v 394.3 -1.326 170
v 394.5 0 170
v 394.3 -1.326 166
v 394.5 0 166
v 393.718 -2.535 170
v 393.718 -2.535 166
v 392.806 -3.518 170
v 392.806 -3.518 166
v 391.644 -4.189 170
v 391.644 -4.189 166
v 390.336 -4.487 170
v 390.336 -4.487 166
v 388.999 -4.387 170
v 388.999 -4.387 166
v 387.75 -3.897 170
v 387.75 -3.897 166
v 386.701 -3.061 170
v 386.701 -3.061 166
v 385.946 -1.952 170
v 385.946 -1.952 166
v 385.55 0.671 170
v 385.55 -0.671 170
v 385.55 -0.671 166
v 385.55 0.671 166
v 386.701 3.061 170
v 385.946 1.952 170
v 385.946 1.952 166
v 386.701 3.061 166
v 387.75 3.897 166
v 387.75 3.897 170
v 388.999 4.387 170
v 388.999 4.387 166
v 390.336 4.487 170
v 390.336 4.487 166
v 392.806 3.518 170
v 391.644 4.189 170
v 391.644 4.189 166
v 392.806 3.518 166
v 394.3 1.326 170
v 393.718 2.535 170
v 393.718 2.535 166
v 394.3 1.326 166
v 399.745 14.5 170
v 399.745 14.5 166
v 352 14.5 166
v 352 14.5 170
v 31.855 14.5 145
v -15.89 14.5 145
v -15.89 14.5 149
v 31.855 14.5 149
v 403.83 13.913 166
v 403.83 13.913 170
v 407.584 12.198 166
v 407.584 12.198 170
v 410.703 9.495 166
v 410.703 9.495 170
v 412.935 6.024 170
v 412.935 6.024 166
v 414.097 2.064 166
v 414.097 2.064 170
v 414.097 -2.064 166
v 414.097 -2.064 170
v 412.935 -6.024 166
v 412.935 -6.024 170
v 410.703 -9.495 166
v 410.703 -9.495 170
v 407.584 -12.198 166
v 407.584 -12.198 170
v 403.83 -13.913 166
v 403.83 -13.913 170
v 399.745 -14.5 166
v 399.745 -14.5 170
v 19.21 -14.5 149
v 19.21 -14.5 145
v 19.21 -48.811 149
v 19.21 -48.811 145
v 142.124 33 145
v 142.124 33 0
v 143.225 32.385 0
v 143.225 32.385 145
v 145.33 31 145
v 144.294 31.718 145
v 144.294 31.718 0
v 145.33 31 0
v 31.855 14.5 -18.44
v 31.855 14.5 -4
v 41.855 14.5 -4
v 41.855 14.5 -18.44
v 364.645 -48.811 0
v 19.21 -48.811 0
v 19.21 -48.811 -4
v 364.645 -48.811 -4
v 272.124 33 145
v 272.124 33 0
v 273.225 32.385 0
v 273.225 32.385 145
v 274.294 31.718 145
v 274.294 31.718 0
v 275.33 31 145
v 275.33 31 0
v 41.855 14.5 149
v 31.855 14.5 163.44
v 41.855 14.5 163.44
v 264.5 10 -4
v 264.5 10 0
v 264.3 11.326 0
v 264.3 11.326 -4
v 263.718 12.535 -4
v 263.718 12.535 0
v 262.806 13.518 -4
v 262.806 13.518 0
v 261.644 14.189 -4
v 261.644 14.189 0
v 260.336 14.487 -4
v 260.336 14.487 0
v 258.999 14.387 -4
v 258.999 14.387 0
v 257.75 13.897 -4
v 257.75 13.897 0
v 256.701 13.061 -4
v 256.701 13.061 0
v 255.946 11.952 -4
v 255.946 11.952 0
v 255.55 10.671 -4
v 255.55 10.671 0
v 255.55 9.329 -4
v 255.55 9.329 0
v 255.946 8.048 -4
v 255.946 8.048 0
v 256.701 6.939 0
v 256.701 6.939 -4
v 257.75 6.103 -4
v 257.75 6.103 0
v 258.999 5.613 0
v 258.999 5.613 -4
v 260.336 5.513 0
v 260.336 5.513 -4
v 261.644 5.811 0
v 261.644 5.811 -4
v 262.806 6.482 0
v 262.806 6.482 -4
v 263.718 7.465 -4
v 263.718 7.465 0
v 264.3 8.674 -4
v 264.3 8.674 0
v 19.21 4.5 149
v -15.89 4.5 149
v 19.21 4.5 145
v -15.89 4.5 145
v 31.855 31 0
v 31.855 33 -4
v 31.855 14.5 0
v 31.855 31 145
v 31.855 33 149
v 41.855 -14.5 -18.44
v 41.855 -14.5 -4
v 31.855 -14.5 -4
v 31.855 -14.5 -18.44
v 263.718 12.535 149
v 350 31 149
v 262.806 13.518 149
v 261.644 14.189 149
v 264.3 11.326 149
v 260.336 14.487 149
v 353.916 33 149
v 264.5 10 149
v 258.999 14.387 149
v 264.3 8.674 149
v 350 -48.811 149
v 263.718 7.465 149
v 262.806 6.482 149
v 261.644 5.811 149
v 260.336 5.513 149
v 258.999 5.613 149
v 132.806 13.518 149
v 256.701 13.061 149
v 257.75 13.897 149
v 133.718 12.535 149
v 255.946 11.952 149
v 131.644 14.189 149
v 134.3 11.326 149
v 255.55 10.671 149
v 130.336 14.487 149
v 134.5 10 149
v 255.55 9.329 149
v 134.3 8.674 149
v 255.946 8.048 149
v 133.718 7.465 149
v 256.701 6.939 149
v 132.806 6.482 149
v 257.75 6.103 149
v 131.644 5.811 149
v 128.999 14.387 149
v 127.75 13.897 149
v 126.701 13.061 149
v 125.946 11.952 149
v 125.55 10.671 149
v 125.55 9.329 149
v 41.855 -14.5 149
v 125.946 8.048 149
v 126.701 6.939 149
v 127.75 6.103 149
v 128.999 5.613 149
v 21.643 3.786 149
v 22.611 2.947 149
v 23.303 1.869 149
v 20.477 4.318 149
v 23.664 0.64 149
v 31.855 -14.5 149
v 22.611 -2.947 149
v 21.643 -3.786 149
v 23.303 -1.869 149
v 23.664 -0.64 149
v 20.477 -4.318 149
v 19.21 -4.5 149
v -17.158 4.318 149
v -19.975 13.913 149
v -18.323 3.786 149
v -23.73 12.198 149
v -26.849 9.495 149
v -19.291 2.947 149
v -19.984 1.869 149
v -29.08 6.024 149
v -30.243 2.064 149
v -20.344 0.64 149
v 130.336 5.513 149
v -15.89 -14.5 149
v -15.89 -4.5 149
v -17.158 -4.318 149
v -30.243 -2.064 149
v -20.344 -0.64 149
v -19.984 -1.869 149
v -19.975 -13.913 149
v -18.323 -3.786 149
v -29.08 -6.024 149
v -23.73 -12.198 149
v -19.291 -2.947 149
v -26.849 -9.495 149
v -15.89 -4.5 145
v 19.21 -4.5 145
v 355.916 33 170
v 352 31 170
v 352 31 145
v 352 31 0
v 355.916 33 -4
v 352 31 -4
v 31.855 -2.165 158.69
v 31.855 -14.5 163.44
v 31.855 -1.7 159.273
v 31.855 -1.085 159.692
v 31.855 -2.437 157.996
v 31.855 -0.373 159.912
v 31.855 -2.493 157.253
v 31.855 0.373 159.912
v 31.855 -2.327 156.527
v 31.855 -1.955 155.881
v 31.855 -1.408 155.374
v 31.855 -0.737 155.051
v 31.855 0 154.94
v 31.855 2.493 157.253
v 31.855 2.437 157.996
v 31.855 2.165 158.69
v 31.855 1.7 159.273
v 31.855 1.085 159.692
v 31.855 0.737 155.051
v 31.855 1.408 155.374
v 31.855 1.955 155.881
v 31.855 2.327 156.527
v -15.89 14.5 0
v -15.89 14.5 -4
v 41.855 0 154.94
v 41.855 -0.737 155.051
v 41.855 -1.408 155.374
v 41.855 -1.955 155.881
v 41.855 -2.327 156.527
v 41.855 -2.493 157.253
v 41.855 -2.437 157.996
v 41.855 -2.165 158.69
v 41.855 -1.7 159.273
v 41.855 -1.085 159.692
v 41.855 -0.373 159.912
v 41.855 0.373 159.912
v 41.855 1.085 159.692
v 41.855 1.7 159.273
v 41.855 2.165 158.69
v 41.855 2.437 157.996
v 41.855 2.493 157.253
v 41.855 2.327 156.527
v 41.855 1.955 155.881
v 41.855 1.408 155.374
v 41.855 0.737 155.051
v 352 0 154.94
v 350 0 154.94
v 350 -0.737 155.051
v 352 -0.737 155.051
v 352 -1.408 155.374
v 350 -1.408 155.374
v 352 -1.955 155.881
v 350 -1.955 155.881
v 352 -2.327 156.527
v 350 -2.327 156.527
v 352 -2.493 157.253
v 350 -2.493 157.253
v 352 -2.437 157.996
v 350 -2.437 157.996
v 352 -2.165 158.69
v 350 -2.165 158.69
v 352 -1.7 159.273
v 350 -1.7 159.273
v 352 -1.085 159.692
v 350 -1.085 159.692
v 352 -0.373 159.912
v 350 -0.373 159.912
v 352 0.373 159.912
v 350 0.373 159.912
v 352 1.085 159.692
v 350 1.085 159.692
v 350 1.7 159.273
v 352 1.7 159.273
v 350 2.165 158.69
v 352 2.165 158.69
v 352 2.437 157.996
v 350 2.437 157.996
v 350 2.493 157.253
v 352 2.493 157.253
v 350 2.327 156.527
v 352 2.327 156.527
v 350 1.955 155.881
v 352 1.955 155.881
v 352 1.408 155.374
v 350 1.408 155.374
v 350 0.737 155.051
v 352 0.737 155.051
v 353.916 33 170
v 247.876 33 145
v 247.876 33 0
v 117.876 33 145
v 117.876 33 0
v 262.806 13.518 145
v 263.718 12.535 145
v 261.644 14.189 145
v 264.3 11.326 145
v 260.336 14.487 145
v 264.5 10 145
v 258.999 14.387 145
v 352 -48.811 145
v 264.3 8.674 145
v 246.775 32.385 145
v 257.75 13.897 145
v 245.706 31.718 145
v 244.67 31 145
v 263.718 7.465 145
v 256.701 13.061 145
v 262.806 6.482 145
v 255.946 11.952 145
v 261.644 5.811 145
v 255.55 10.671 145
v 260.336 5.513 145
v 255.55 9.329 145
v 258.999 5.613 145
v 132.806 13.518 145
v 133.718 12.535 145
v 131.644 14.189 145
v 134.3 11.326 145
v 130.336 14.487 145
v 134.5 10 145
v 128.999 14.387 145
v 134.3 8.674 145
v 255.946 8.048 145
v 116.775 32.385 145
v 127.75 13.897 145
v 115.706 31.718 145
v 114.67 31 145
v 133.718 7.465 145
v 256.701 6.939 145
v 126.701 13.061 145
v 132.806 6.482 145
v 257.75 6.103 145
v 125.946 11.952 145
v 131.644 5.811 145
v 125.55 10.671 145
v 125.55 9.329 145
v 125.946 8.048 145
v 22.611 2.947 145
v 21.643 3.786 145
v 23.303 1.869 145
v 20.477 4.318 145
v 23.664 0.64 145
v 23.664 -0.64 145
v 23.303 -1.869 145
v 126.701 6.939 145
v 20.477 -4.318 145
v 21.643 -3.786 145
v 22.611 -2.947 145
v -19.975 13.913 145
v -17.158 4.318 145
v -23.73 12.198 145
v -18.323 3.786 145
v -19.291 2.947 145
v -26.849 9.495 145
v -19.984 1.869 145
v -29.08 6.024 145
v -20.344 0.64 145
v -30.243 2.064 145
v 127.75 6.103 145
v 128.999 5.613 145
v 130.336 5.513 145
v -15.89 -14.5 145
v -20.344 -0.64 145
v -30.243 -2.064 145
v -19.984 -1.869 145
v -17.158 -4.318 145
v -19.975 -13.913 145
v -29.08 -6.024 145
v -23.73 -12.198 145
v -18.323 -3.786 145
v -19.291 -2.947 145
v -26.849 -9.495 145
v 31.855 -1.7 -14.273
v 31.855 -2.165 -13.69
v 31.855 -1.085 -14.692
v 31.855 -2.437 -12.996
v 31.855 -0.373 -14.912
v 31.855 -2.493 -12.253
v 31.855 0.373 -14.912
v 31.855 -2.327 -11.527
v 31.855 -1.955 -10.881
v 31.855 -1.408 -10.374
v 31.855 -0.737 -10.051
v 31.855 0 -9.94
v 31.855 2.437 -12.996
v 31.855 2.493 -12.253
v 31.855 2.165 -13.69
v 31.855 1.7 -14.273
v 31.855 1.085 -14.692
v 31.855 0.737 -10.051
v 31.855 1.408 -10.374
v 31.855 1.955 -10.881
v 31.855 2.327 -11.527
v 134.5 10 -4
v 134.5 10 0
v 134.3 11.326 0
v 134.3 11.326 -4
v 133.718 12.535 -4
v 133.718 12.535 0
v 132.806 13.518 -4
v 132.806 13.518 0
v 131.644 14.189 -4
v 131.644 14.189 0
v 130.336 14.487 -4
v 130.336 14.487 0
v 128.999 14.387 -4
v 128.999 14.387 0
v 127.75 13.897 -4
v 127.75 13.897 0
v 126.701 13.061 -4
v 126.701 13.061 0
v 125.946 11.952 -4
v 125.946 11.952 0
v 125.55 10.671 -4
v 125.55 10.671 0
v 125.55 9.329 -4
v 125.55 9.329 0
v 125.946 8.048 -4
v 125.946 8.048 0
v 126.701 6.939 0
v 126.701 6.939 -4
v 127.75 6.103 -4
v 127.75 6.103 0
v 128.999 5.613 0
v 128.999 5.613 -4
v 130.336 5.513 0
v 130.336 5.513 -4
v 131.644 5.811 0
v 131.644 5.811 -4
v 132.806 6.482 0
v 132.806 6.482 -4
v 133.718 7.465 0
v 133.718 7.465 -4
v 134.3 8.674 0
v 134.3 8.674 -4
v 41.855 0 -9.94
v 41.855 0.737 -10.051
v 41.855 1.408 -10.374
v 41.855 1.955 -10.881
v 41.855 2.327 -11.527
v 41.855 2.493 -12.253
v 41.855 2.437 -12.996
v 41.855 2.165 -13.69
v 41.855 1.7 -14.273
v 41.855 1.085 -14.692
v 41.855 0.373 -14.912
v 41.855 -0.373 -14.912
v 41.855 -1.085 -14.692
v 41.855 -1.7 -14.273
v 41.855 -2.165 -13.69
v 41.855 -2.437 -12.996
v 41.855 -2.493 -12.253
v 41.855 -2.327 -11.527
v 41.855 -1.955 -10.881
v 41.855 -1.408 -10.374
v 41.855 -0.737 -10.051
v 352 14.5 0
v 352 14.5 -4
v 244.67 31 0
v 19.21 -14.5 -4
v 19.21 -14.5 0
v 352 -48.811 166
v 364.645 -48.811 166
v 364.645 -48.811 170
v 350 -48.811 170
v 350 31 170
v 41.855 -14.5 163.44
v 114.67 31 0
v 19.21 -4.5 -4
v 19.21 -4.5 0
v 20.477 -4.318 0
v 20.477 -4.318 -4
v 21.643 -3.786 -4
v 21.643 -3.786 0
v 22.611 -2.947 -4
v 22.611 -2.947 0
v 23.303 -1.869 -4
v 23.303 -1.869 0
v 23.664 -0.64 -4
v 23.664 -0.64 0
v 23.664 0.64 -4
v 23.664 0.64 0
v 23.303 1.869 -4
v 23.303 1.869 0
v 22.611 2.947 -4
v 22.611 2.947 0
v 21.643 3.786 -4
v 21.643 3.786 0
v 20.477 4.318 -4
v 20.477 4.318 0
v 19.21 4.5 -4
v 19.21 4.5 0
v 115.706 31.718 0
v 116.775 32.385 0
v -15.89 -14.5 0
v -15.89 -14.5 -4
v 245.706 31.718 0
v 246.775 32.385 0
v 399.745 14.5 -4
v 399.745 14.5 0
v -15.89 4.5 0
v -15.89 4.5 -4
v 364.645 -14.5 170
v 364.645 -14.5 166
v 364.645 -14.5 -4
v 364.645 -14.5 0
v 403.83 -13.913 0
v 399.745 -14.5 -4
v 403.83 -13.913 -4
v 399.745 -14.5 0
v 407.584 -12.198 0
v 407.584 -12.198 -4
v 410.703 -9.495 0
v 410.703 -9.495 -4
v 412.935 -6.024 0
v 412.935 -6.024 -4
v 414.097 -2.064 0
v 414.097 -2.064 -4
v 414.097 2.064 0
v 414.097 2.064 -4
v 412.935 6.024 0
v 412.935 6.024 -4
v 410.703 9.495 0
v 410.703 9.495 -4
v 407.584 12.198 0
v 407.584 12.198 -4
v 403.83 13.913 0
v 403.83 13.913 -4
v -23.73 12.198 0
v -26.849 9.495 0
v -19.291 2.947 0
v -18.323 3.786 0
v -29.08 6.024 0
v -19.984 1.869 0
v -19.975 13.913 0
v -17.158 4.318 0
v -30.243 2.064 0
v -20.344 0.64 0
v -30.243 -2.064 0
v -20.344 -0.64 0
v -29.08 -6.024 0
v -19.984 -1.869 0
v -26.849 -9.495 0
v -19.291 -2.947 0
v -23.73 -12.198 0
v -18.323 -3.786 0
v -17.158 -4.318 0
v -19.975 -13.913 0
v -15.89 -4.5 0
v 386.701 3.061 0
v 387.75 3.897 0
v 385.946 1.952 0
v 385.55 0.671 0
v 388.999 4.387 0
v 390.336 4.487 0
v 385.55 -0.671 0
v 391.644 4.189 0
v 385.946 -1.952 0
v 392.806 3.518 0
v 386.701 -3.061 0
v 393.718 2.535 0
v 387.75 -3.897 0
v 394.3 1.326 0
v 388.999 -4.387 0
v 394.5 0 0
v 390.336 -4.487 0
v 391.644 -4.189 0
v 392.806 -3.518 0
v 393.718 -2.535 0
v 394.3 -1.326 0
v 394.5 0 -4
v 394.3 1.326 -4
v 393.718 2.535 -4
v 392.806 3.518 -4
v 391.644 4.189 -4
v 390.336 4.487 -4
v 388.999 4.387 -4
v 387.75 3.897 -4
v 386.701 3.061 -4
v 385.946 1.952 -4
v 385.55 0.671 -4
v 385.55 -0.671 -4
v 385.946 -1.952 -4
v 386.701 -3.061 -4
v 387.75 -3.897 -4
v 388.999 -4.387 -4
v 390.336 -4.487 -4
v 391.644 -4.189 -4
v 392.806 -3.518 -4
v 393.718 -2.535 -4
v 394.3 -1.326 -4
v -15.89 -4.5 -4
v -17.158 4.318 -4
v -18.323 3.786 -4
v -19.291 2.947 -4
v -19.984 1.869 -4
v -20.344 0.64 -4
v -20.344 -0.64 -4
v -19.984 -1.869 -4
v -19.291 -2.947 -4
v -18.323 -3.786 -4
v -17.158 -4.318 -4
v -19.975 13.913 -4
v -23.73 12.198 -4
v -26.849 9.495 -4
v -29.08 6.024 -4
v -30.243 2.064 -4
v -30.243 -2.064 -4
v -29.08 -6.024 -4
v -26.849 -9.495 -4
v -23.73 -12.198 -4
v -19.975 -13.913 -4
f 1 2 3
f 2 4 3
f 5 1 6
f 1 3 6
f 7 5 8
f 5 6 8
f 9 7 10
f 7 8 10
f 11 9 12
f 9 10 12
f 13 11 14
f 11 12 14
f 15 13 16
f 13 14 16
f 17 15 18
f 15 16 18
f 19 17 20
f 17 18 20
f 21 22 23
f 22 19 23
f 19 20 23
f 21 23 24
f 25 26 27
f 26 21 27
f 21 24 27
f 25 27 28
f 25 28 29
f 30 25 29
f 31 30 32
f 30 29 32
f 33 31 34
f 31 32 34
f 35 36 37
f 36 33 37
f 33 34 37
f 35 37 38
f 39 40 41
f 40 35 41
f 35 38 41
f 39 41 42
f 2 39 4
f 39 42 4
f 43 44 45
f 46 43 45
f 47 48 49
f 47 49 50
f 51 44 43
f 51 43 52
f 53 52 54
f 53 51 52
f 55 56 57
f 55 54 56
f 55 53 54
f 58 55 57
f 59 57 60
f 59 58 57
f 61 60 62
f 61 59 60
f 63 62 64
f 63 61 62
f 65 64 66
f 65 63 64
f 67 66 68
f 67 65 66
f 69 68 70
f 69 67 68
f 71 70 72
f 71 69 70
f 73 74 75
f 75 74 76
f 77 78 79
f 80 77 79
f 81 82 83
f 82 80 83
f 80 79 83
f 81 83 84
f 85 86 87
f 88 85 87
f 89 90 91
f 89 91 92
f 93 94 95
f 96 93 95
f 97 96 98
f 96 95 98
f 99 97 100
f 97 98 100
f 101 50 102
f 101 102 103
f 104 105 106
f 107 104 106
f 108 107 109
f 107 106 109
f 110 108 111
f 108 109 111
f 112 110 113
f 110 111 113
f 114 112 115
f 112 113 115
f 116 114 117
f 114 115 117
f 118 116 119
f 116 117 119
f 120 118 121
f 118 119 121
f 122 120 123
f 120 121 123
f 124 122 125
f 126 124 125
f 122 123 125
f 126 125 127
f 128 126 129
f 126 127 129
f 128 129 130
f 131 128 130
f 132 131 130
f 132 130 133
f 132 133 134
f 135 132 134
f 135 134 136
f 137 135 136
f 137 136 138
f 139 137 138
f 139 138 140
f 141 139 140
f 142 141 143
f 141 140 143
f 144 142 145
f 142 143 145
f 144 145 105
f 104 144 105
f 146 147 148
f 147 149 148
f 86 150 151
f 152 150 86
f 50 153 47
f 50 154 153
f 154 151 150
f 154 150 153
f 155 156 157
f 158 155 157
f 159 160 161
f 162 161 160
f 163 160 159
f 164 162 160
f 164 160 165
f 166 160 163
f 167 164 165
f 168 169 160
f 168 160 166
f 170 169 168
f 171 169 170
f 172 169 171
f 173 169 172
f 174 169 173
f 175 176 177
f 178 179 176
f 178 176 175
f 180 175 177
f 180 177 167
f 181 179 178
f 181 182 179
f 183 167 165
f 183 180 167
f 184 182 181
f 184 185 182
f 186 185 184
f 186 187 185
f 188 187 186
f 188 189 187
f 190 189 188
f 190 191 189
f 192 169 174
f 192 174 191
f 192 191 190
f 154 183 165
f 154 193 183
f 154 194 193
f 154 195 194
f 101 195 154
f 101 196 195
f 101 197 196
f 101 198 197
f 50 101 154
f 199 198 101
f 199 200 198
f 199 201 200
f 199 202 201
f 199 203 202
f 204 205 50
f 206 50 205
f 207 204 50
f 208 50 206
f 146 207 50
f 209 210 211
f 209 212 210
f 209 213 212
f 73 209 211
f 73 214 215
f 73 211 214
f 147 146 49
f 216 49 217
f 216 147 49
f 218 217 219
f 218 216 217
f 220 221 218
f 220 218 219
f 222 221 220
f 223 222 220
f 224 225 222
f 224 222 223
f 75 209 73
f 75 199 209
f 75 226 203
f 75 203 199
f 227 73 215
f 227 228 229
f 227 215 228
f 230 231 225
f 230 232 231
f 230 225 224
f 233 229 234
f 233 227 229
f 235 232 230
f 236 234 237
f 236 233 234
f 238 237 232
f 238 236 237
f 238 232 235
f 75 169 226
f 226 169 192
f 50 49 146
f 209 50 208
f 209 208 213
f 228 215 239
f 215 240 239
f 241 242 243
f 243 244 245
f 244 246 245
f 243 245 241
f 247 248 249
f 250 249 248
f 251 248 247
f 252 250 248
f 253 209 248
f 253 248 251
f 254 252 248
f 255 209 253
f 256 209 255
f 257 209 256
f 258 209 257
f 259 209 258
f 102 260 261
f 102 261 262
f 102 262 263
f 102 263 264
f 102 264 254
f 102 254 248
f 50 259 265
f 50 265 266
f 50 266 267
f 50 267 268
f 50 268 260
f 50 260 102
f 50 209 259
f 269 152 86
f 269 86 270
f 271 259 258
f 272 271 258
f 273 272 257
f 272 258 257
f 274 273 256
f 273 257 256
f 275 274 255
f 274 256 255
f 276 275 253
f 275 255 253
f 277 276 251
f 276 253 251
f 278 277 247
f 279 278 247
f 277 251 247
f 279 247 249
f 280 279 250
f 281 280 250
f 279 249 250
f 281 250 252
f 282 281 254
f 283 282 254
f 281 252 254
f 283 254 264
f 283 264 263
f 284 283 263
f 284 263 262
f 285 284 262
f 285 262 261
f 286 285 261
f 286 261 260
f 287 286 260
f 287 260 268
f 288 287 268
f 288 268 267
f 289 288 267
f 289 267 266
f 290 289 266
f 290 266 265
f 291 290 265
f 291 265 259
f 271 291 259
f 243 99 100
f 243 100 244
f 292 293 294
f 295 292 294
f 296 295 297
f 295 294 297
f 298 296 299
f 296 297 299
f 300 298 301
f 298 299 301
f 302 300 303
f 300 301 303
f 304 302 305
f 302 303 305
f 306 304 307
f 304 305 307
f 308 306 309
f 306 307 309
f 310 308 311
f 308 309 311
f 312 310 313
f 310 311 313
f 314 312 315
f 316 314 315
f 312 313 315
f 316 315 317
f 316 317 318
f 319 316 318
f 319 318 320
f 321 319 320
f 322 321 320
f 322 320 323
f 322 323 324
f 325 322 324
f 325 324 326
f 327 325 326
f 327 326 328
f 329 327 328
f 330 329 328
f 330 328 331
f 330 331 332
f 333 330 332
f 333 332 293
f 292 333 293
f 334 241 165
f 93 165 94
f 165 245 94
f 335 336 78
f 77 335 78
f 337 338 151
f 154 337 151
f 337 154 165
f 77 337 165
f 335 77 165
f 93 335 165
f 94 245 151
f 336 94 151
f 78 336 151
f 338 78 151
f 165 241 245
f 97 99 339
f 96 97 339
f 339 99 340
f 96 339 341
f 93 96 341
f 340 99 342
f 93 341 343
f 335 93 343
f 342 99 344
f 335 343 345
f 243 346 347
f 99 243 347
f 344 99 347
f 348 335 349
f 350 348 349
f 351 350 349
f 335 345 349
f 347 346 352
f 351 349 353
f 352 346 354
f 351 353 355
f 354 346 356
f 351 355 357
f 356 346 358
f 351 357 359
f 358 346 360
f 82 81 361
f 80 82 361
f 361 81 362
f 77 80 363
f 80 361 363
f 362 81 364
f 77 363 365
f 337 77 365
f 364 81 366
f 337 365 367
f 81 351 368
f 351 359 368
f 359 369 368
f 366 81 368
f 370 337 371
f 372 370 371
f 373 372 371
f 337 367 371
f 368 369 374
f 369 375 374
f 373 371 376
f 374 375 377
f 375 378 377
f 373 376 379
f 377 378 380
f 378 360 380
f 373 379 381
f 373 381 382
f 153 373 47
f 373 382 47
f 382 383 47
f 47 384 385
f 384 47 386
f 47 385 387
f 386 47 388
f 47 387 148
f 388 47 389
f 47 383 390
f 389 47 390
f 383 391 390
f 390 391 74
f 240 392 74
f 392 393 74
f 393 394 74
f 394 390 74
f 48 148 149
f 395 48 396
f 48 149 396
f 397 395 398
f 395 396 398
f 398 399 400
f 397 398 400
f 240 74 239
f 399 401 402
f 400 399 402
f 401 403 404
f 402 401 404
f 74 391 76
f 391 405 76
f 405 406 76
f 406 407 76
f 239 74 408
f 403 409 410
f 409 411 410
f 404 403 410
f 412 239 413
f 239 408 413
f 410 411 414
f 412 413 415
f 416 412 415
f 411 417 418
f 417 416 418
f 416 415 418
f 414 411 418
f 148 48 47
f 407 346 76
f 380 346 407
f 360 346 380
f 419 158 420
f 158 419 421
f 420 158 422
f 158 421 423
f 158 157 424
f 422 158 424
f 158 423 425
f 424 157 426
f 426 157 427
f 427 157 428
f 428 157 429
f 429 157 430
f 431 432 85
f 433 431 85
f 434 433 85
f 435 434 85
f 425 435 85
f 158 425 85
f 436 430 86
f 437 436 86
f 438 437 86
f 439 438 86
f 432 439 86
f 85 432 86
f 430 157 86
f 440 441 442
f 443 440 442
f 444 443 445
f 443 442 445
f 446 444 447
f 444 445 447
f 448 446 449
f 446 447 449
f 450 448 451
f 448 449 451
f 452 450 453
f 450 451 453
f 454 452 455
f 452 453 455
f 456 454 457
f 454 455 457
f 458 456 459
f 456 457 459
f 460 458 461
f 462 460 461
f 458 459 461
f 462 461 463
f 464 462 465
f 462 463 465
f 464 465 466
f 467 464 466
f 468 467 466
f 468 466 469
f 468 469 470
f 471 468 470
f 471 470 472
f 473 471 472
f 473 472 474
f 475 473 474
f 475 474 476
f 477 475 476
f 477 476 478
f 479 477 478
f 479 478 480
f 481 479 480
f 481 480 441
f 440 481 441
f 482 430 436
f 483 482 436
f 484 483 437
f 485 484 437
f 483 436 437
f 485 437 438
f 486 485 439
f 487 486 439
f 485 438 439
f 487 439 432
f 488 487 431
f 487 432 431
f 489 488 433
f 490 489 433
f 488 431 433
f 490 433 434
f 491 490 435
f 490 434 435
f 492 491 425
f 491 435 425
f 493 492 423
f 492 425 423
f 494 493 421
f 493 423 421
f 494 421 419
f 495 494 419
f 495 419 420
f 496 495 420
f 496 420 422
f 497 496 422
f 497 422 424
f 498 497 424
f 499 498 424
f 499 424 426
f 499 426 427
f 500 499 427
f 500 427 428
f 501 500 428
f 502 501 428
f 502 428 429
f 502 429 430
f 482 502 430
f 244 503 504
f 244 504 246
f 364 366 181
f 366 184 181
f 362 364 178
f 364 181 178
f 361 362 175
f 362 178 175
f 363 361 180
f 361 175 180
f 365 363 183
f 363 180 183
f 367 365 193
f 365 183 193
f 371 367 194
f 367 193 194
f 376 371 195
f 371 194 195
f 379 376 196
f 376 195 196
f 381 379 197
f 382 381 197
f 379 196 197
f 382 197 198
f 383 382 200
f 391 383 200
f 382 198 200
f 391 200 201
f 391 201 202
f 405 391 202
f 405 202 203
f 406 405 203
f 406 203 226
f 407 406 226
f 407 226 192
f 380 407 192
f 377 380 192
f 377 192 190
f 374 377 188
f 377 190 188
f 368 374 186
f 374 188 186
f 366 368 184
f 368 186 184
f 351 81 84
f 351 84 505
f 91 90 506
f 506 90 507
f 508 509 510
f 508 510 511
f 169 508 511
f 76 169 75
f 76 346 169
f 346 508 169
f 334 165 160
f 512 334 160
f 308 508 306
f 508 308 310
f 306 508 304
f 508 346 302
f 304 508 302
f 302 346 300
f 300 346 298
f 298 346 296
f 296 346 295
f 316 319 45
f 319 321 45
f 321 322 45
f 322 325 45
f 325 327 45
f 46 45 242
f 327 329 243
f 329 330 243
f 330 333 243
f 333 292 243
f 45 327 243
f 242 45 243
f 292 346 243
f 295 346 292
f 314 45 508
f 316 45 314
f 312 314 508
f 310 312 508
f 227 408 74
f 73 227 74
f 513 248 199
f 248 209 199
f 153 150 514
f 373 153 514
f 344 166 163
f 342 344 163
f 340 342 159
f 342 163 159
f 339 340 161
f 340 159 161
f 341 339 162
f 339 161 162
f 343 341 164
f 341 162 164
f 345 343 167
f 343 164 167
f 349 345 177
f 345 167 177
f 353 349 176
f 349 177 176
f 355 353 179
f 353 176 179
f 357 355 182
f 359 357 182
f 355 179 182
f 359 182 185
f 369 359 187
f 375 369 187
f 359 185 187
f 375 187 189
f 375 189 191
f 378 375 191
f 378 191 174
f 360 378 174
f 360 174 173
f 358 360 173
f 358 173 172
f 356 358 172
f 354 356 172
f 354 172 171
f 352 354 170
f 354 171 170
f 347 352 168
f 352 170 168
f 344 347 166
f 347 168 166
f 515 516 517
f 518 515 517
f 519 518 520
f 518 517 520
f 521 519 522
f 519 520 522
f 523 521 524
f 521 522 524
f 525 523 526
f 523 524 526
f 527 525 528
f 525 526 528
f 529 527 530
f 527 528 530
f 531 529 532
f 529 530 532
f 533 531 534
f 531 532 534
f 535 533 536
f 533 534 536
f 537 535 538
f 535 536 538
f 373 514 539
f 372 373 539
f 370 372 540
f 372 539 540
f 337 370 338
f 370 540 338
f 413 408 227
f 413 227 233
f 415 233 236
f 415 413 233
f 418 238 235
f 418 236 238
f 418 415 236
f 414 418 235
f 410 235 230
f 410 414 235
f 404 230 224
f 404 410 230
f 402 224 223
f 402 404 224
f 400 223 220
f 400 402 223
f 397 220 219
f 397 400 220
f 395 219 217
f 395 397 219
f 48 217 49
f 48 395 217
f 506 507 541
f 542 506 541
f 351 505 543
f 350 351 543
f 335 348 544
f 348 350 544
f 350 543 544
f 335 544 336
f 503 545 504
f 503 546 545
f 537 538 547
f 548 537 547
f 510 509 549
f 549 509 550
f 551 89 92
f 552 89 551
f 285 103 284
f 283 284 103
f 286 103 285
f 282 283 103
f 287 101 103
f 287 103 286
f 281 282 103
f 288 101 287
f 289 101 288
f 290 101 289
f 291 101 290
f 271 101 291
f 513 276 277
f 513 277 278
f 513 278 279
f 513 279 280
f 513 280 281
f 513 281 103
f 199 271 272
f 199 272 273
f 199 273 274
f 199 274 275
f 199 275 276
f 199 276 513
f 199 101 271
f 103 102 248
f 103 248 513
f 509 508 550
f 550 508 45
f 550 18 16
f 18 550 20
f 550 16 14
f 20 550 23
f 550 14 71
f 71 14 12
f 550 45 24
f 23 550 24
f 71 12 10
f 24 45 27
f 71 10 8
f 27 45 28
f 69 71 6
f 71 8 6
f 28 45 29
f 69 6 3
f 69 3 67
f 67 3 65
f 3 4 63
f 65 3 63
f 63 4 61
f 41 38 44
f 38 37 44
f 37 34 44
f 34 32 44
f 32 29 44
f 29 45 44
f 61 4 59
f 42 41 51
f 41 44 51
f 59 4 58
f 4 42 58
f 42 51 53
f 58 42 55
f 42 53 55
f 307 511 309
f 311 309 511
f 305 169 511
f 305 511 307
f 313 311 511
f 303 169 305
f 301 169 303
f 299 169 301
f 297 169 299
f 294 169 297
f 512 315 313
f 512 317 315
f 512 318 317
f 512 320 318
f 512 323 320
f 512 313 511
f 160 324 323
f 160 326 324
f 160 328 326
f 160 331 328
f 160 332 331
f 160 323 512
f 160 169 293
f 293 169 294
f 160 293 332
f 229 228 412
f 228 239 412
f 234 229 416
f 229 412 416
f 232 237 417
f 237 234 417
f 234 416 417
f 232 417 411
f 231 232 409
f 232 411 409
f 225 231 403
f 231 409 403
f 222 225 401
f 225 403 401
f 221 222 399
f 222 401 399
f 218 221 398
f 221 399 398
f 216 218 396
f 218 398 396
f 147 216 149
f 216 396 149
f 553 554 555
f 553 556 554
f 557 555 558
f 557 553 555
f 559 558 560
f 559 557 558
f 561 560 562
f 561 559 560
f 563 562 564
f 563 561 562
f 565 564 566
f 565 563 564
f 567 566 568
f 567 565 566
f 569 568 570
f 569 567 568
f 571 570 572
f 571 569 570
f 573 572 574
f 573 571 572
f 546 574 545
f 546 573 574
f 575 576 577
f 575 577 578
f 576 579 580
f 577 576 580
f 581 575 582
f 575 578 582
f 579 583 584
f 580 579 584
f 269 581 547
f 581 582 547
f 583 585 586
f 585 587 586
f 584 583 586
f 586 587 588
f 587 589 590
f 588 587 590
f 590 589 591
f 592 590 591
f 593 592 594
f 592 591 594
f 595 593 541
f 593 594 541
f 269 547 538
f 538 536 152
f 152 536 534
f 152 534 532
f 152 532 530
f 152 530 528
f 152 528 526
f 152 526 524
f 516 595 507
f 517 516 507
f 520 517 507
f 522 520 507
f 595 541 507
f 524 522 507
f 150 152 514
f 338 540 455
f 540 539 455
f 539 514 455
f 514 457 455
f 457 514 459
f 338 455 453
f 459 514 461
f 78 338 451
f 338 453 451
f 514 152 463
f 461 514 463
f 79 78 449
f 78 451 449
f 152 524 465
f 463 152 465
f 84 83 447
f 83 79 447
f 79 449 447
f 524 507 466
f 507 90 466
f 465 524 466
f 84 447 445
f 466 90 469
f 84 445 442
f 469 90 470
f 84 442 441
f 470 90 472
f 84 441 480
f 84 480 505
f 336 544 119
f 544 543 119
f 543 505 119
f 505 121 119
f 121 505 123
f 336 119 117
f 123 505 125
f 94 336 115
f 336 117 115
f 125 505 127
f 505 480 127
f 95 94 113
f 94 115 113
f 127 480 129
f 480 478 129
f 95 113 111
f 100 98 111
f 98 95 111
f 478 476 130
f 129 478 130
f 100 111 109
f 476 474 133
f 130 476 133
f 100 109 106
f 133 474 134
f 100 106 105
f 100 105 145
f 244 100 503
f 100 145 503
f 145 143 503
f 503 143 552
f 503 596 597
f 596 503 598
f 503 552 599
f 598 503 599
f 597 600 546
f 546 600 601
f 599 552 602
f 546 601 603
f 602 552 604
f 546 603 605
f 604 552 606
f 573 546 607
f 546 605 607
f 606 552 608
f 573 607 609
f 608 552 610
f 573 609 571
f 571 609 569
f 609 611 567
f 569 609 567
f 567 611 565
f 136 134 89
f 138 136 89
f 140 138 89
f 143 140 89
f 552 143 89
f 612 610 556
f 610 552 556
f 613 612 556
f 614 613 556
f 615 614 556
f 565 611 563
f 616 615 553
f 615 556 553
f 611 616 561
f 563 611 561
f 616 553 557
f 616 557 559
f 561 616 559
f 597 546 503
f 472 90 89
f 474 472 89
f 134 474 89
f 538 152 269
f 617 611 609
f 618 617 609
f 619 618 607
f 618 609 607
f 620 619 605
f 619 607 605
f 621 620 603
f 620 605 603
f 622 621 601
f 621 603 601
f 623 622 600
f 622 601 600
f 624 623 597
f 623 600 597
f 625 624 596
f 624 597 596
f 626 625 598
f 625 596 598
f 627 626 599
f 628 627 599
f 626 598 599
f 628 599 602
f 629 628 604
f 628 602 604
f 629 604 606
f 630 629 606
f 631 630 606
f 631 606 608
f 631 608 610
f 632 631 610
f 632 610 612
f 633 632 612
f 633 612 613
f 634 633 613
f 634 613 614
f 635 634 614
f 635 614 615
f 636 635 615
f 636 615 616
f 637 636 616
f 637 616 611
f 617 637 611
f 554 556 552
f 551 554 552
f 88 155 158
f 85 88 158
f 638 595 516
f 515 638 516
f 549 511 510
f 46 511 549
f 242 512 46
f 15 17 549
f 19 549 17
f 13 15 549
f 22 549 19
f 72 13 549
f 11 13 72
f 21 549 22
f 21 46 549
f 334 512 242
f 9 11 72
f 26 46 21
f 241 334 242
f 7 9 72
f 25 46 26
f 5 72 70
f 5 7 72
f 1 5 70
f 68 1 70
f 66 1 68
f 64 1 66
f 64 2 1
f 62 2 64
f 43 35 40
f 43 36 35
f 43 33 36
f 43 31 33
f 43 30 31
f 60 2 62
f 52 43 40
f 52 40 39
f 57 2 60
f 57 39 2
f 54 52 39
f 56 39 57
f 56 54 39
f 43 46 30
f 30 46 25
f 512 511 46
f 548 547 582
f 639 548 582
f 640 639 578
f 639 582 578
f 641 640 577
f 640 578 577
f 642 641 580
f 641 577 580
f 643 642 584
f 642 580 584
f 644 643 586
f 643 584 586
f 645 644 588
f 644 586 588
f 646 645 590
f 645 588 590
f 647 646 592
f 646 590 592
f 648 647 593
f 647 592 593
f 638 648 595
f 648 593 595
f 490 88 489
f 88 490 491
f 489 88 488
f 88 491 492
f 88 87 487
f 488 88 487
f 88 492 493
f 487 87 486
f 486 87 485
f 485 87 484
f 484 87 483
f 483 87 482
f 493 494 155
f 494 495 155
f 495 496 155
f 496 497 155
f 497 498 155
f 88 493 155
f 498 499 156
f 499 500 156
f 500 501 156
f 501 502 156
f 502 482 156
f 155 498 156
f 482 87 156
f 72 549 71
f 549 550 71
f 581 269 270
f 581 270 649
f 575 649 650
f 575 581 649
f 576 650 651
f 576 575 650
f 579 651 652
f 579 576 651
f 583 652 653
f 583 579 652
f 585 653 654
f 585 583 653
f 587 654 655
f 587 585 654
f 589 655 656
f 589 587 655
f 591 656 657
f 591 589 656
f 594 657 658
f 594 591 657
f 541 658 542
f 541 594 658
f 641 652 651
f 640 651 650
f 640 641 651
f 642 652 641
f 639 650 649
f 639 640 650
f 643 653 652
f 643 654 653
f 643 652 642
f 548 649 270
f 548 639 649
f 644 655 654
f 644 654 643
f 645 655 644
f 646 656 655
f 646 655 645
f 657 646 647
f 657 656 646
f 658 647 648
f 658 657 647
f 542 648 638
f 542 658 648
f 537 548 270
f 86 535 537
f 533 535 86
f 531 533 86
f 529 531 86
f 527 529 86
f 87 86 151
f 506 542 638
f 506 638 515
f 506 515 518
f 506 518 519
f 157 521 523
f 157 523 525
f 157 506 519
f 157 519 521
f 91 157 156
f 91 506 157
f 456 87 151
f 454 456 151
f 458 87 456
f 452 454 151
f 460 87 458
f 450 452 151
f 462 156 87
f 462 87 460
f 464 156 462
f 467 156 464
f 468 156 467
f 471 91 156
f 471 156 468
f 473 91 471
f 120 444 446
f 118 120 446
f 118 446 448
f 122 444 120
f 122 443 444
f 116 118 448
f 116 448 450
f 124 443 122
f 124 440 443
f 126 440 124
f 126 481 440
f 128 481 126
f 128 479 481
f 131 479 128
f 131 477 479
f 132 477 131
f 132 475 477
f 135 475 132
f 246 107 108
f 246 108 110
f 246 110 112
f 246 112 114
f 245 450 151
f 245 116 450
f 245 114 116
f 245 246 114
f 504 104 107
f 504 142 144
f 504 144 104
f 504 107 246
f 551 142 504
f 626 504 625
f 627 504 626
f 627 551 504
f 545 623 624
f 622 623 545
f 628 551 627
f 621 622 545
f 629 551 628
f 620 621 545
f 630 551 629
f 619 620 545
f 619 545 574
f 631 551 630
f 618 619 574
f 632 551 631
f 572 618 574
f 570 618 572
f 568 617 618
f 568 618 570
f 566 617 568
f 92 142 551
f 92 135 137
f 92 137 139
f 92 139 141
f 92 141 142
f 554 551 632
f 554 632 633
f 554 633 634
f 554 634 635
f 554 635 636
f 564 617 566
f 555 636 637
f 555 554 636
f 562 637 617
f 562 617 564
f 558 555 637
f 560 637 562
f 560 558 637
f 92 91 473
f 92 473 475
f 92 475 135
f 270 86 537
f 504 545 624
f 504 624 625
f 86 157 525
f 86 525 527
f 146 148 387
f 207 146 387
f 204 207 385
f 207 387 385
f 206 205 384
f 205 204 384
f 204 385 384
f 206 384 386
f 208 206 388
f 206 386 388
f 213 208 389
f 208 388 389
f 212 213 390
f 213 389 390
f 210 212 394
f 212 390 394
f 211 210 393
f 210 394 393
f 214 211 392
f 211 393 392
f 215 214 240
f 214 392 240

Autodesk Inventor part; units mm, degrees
sketch "Szkic1" plane through (0, 0, 0) normal (0, 0, 1) x (1, 0, 0)
  arc A0 (0, 35) -> (0, -35) centre (0, 0) ccw construction
  line L0 (0, 35) -> (390, 35) construction
  line L1 (0, -35) -> (390, -35) construction
  arc A1 (390, -35) -> (390, 35) centre (390, 0) ccw construction
  circle A2 centre (0, 0) radius 4.5
  circle A3 centre (390, 0) radius 4.5
  line L2 (130, 35) -> (130, 10) construction
  line L3 (260, 35) -> (260, 10) construction
  circle A4 centre (130, 10) radius 25 construction
  circle A5 centre (260, 10) radius 25 construction
  circle A6 centre (130, 10) radius 4.5
  circle A7 centre (260, 10) radius 4.5
  circle A8 centre (0, 0) radius 35 construction
  circle A9 centre (390, 0) radius 35 construction
  line L4 (117.8756, 33) -> (31.8551, 33)
  line L5 (375.6125, 33) -> (272.1244, 33)
  line L6 (247.8756, 33) -> (142.1244, 33)
  line L7 (31.8551, 31) -> (114.6703, 31)
  line L8 (145.3297, 31) -> (244.6703, 31)
  line L9 (275.3297, 31) -> (371.697, 31)
  arc A10 (375.6125, 33) -> (371.697, 31) centre (390, 0) ccw
  arc A11 (117.8756, 33) -> (114.6703, 31) centre (130, 10) ccw
  arc A12 (145.3297, 31) -> (142.1244, 33) centre (130, 10) ccw
  arc A13 (247.8756, 33) -> (244.6703, 31) centre (260, 10) ccw
  arc A14 (275.3297, 31) -> (272.1244, 33) centre (260, 10) ccw
  line L10 (31.8551, 14.5) -> (31.8551, 35) construction
  line L11 (31.8551, 33) -> (31.8551, 31)
  line L12 (260, 10) -> (260, 0)
  line L13 (130, 10) -> (130, 0)
  point P0 (423.5971, -9.8098)
  dimension "d94" = 50
  dimension "d0" = 70
  dimension "d1" = 390
  dimension "d2" = 390
  dimension "d3" = 70
  dimension "d4" = 9
  dimension "d5" = 9
  dimension "d10" = 25
  dimension "d11" = 25
  dimension "d12" = 9
  dimension "d13" = 9
  dimension "d14" = 130
  dimension "d15" = 260
  dimension "d24" = 2
  dimension "d25" = 2
  dimension "d26" = 2
  dimension "d27" = 1
  dimension "d95" = 2
extrude "Wyciągnięcie proste1" add sketch "Szkic1" along normal blind 145 contours A11 L7 L11 L4 | A10 L9 A14 L5 | A13 L8 A12 L6
ref_plane "Płaszczyzna konstrukcyjna1" through (117.8756, 33, 145) normal (0, 0, 1) x (-1, 0, 0)
sketch "Szkic3" plane through (117.8756, 33, 145) normal (0, 0, 1) x (-1, 0, 0)
  circle A0 centre (117.8756, 33) radius 4.5 projected
  arc A1 (133.7659, 28.5) -> (133.7659, 37.5) centre (133.7659, 33) ccw
  arc A2 (98.6659, 37.5) -> (98.6659, 28.5) centre (98.6659, 33) ccw
  line L0 (133.7659, 28.5) -> (98.6659, 28.5)
  line L1 (98.6659, 37.5) -> (133.7659, 37.5)
  line L2 (98.6659, 18.5) -> (133.7659, 18.5)
  arc A3 (133.7659, 18.5) -> (133.7659, 47.5) centre (133.7659, 33) ccw
  line L3 (133.7659, 47.5) -> (98.6659, 47.5)
  line L4 (86.0205, 18.5) -> (86.0205, -2) construction
  line L5 (98.6659, 18.5) -> (86.0205, 18.5)
  line L6 (98.6659, 47.5) -> (86.0205, 47.5)
  line L7 (86.0205, 0) -> (86.0205, 2) projected
  line L8 (86.0205, 18.5) -> (86.0205, 0)
  line L9 (98.6659, 47.5) -> (98.6659, 81.8113)
  line L10 (98.6659, 81.8113) -> (-234.1244, 81.8113)
  line L11 (-157.4541, 2) -> (-253.8214, 2) projected
  line L12 (86.0205, 0) -> (86.0205, 2)
  line L13 (-257.7369, 0) -> (-154.2487, 0) projected
  line L14 (86.0205, 0) -> (-238.0399, 0)
  circle A4 centre (-272.1244, 33) radius 35 construction
  line L15 (-234.1244, 2) -> (-234.1244, 18.5)
  line L16 (-234.1244, 2) -> (-238.0399, 0)
  line L17 (-246.7694, 47.5) -> (-246.7694, 81.8113)
  line L18 (-246.7694, 81.8113) -> (-234.1244, 81.8113)
  line L19 (-303.9795, 47.5) -> (-409.6259, 47.5) construction
  line L20 (-234.1244, 47.5) -> (-246.7694, 47.5)
  line L21 (-234.1244, 18.5) -> (-281.8694, 18.5)
  line L22 (-246.7694, 47.5) -> (-281.8694, 47.5)
  arc A5 (-281.8694, 47.5) -> (-281.8694, 18.5) centre (-281.8694, 33) ccw
  point P0 (-238.0399, 0)
  dimension "d33" = 9
  dimension "d34" = 9
  dimension "d35" = 10
  dimension "d36" = 47.7454
  dimension "d37" = 12.6455
  dimension "d38" = 12.6455
  dimension "d39" = 12.6455
  dimension "d40" = 0
  dimension "d64" = 47.745
  dimension "d93" = 16.5
extrude "Wyciągnięcie proste2" add sketch "Szkic3" along normal blind 4
ref_plane "Płaszczyzna konstrukcyjna4" through (117.8756, 33, 72.5) normal (0, 0, -1) x (-1, 0, 0)
mirror "Odbij2" about plane through (117.8756, 33, 72.5) normal (0, 0, -1) of "Wyciągnięcie proste2"
extrude "Wyciągnięcie proste4" cut sketch "Szkic1" along normal mid plane 10000 contours A6 | A7
sketch "Szkic8" plane through (0, 0, 145) normal (0, 0, 1) x (1, 0, 0)
  line L0 (352, 31) -> (371.697, 31) projected
  line L1 (352, 31) -> (355.9155, 33) projected
  line L2 (352, 31) -> (355.9155, 33)
  line L3 (375.6125, 33) -> (355.9155, 33) projected
  line L4 (355.9155, 33) -> (375.6125, 33)
  arc A0 (375.6125, 33) -> (371.697, 31) centre (390, 0) ccw projected
  line L5 (375.6125, 33) -> (371.697, 31)
  line L6 (352, 14.5) -> (352, 31) projected
  line L7 (371.697, 31) -> (352, 31)
  point P0 (0, 0)
  point P1 (352, -48.8113)
ref_plane "Płaszczyzna konstrukcyjna6" through (0, 0, 72.5) normal (0, 0, 1) x (1, 0, 0)
extrude "Wyciągnięcie proste5" cut sketch "Szkic8" along normal mid plane 1000 contours L1 L3 A0 L0
ref_plane "Płaszczyzna konstrukcyjna9" through (117.8756, 33, 149) normal (0, 0, 1) x (1, 0, 0)
sketch "Szkic12" plane through (117.8756, 33, 149) normal (0, 0, 1) x (1, 0, 0)
  line L0 (281.8694, -18.5) -> (234.1244, -18.5) projected
  arc A0 (281.8694, -47.5) -> (281.8694, -18.5) centre (281.8694, -33) ccw projected
  line L1 (246.7694, -47.5) -> (281.8694, -47.5) projected
  line L2 (246.7694, -81.8113) -> (246.7694, -47.5) projected
  line L3 (234.1244, -2) -> (234.1244, -81.8113) projected
  line L4 (-98.6659, -81.8113) -> (246.7694, -81.8113) projected
  point P0 (-117.8756, -33)
extrude "Wyciągnięcie proste7" cut sketch "Szkic12" against normal blind 17
extrude "Wyciągnięcie proste8" cut sketch "Szkic1" against normal blind 17 contours A3
ref_plane "Płaszczyzna konstrukcyjna10" through (117.8756, 33, 149) normal (0, 0, 1) x (1, 0, 0)
sketch "Szkic13" plane through (117.8756, 33, 149) normal (0, 0, 1) x (1, 0, 0)
  line L0 (234.1244, -81.8113) -> (234.1244, -2) projected
  line L1 (232.1244, -81.8113) -> (232.1244, -2)
  line L2 (234.1244, -2) -> (238.0399, 0) projected
  line L3 (238.0399, 0) -> (236.0399, 0)
  line L4 (238.0399, 0) -> (-86.0205, 0) projected
  line L5 (236.0399, 0) -> (232.1244, -2)
  line L6 (238.0399, 0) -> (234.1244, -2)
  line L7 (234.1244, -81.8113) -> (232.1244, -81.8113)
  line L8 (-98.6659, -81.8113) -> (246.7694, -81.8113) projected
  point P0 (-117.8756, -33)
  dimension "d70" = 2
  dimension "d71" = 2
extrude "Wyciągnięcie proste9" add sketch "Szkic13" along normal blind 17
ref_plane "Płaszczyzna konstrukcyjna11" through (117.8756, 33, 166) normal (0, 0, 1) x (1, 0, 0)
sketch "Szkic14" plane through (117.8756, 33, 166) normal (0, 0, 1) x (1, 0, 0)
  line L0 (232.1244, -81.8113) -> (234.1244, -81.8113) projected
  line L1 (-98.6659, -81.8113) -> (246.7694, -81.8113) projected
  line L2 (232.1244, -81.8113) -> (246.7694, -81.8113)
  line L3 (246.7694, -81.8113) -> (246.7694, -47.5) projected
  line L4 (246.7694, -81.8113) -> (246.7694, -47.5)
  line L5 (246.7694, -47.5) -> (281.8694, -47.5) projected
  line L6 (246.7694, -47.5) -> (281.8694, -47.5)
  line L7 (281.8694, -18.5) -> (234.1244, -18.5) projected
  line L8 (234.1244, -81.8113) -> (234.1244, -2) projected
  arc A0 (281.8694, -47.5) -> (281.8694, -18.5) centre (281.8694, -33) ccw projected
  circle A1 centre (272.1244, -33) radius 4.5 projected
  line L9 (232.1244, -2) -> (232.1244, -81.8113) projected
  line L10 (236.0399, 0) -> (232.1244, -2) projected
  line L11 (238.0399, 0) -> (236.0399, 0) projected
  line L12 (234.1244, -2) -> (238.0399, 0) projected
  point P0 (-117.8756, -33)
extrude "Wyciągnięcie proste10" add sketch "Szkic14" along normal blind 4
ref_plane "Płaszczyzna konstrukcyjna12" through (364.645, -48.8113, -4) normal (0, 0, -1) x (-1, 0, 0)
sketch "Szkic15" plane through (364.645, -48.8113, -4) normal (0, 0, -1) x (-1, 0, 0)
  line L0 (332.7899, 63.3113) -> (322.7899, 63.3113)
  line L1 (322.7899, 63.3113) -> (322.7899, 34.3113)
  line L2 (322.7899, 34.3113) -> (332.7899, 34.3113)
  line L3 (332.7899, 34.3113) -> (332.7899, 63.3113)
  point P0 (364.645, 48.8113)
  dimension "d78" = 10
extrude "Wyciągnięcie proste11" add sketch "Szkic15" along normal blind 14.44
ref_plane "Płaszczyzna konstrukcyjna13" through (117.8756, 33, 149) normal (0, 0, 1) x (1, 0, 0)
sketch "Szkic16" plane through (117.8756, 33, 149) normal (0, 0, 1) x (1, 0, 0)
  line L0 (-86.0205, -18.5) -> (-133.7659, -18.5) projected
  line L1 (-86.0205, -47.5) -> (-76.0205, -47.5) projected
  line L2 (-86.0205, -18.5) -> (-76.0205, -18.5)
  line L3 (-76.0205, -18.5) -> (-76.0205, -47.5)
  line L4 (-76.0205, -47.5) -> (-86.0205, -47.5)
  line L5 (-86.0205, -47.5) -> (-86.0205, -18.5)
  point P0 (-117.8756, -33)
  point P1 (-86.0205, -47.5)
  dimension "d82" = 10
extrude "Wyciągnięcie proste12" add sketch "Szkic16" along normal blind 14.44
ref_plane "Płaszczyzna konstrukcyjna14" through (31.8551, -14.5, -4) normal (-1, 0, 0) x (0, 0, 1)
sketch "Szkic17" plane through (31.8551, -14.5, -4) normal (-1, 0, 0) x (0, 0, 1)
  line L0 (4, 0) -> (4, 29) projected
  line L1 (4, 19) -> (-14.44, 19)
  line L2 (-14.44, 29) -> (-14.44, 0) projected
  line L3 (4, 10) -> (0, 10) projected
  line L4 (4, 10) -> (-12.44, 10)
  line L5 (4, 18.5) -> (-12.44, 18.5)
  line L6 (-12.44, 18.5) -> (-4.44, 18.5)
  line L7 (-4.44, 18.5) -> (-4.44, 10.5)
  line L8 (-4.44, 10.5) -> (-12.44, 10.5)
  line L9 (-12.44, 10.5) -> (-12.44, 18.5)
  circle A0 centre (-8.44, 14.5) radius 2.5
  point P0 (4, 14.5)
  dimension "d86" = 9
  dimension "d87" = 0.5
  dimension "d88" = 8
  dimension "d89" = 8
  dimension "d90" = 5
extrude "Wyciągnięcie proste13" cut sketch "Szkic17" against normal through all contours A0
mirror "Odbij3" about plane through (117.8756, 33, 72.5) normal (0, 0, -1) of "Wyciągnięcie proste13"
sketch "Szkic20" plane through (117.8756, 33, 72.5) normal (0, 0, 1) x (-1, 0, 0)
  point P0 (117.8756, -33)
ref_plane "Płaszczyzna konstrukcyjna5" through (117.8756, 33, 72.5) normal (0, 0, -1) x (-1, 0, 0)
properties part number "Podstawa"
